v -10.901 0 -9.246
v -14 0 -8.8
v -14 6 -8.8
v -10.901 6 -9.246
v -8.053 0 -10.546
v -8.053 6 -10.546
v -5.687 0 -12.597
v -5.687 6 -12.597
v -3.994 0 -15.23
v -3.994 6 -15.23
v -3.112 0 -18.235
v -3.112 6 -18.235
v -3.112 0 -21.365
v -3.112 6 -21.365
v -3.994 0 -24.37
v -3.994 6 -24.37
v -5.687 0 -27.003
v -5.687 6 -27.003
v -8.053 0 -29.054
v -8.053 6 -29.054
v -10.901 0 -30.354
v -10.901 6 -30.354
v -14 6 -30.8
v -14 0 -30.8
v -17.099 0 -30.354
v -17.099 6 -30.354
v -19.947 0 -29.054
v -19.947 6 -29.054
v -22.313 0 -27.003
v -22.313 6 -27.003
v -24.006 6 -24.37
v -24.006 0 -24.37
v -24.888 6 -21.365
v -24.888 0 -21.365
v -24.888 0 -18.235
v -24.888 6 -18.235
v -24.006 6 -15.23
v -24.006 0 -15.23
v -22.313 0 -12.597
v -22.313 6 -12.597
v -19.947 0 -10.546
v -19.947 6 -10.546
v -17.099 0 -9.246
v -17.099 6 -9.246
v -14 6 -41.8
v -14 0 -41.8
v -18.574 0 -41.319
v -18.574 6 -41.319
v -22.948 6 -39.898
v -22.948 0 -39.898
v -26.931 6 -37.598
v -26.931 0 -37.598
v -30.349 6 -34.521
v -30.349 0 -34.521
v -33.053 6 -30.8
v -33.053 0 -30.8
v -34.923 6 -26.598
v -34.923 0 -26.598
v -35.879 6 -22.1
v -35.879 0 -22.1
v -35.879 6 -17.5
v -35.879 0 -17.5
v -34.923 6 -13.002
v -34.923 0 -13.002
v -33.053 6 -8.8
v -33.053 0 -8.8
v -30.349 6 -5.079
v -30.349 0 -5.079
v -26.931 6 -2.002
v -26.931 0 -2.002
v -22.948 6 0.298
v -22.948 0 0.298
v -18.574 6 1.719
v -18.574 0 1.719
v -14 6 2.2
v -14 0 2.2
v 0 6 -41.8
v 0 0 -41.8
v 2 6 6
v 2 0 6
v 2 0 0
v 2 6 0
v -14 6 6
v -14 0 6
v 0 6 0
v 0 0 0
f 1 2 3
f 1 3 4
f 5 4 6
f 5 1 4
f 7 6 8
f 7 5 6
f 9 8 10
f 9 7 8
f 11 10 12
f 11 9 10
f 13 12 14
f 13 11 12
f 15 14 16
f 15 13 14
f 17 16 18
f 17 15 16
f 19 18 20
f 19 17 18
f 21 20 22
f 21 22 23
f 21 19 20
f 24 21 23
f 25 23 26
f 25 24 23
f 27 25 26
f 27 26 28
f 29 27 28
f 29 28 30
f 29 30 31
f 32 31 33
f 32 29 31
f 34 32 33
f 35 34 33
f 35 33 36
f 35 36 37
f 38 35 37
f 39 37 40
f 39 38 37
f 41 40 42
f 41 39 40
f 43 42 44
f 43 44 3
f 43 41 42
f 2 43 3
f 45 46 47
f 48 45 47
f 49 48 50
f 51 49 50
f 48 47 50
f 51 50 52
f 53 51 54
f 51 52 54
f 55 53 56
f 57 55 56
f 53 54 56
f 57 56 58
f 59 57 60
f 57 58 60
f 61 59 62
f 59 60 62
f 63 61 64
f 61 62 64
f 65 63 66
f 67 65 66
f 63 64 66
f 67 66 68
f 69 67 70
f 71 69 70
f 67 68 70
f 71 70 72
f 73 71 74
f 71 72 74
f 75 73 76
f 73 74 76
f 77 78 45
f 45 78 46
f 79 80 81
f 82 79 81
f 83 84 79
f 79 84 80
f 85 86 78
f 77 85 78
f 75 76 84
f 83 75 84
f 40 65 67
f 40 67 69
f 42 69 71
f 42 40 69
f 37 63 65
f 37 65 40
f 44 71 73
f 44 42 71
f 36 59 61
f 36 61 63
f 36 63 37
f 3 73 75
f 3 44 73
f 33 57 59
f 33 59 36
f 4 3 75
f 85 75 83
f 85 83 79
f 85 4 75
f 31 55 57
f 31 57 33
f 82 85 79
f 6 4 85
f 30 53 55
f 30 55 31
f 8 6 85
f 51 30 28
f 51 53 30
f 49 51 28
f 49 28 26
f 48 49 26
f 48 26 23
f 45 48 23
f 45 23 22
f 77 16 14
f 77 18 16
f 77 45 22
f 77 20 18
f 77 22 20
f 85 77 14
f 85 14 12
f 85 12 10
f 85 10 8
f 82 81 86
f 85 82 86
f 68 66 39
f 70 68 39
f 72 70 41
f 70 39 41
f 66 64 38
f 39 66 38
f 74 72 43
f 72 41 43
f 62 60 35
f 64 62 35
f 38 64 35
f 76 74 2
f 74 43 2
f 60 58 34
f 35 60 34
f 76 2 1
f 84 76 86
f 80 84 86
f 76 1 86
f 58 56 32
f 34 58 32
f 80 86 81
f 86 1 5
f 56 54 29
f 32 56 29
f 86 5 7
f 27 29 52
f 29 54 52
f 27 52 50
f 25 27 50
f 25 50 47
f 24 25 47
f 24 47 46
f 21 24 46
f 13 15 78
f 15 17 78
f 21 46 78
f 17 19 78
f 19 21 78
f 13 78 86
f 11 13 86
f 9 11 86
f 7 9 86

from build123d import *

# Parameters (mm, degrees)
SKETCH1_R           = 11
BOSS_EXTRUDE1_DEPTH = 6


with BuildPart() as part:
    # Sketch1 → Boss-Extrude1 (new body)
    with BuildSketch(Plane(origin=(0, 0, 0), x_dir=(1, 0, 0), z_dir=(0, 1, 0))):
        with BuildLine():
            Line((0, 0), (0, 41.8))
            Line((0, 41.8), (-14, 41.8))
            ThreePointArc((-14, 41.8), (-36, 19.8), (-14, -2.2))
            Line((-14, -2.2), (-14, -6))
            Line((-14, -6), (2, -6))
            Line((2, -6), (2, 0))
            Line((2, 0), (0, 0))
        make_face()
        with Locations(Location((-14, 19.8, 0), (0, 0, 270))):
            Circle(SKETCH1_R, mode=Mode.SUBTRACT)
    extrude(amount=BOSS_EXTRUDE1_DEPTH)


solid = part.part
